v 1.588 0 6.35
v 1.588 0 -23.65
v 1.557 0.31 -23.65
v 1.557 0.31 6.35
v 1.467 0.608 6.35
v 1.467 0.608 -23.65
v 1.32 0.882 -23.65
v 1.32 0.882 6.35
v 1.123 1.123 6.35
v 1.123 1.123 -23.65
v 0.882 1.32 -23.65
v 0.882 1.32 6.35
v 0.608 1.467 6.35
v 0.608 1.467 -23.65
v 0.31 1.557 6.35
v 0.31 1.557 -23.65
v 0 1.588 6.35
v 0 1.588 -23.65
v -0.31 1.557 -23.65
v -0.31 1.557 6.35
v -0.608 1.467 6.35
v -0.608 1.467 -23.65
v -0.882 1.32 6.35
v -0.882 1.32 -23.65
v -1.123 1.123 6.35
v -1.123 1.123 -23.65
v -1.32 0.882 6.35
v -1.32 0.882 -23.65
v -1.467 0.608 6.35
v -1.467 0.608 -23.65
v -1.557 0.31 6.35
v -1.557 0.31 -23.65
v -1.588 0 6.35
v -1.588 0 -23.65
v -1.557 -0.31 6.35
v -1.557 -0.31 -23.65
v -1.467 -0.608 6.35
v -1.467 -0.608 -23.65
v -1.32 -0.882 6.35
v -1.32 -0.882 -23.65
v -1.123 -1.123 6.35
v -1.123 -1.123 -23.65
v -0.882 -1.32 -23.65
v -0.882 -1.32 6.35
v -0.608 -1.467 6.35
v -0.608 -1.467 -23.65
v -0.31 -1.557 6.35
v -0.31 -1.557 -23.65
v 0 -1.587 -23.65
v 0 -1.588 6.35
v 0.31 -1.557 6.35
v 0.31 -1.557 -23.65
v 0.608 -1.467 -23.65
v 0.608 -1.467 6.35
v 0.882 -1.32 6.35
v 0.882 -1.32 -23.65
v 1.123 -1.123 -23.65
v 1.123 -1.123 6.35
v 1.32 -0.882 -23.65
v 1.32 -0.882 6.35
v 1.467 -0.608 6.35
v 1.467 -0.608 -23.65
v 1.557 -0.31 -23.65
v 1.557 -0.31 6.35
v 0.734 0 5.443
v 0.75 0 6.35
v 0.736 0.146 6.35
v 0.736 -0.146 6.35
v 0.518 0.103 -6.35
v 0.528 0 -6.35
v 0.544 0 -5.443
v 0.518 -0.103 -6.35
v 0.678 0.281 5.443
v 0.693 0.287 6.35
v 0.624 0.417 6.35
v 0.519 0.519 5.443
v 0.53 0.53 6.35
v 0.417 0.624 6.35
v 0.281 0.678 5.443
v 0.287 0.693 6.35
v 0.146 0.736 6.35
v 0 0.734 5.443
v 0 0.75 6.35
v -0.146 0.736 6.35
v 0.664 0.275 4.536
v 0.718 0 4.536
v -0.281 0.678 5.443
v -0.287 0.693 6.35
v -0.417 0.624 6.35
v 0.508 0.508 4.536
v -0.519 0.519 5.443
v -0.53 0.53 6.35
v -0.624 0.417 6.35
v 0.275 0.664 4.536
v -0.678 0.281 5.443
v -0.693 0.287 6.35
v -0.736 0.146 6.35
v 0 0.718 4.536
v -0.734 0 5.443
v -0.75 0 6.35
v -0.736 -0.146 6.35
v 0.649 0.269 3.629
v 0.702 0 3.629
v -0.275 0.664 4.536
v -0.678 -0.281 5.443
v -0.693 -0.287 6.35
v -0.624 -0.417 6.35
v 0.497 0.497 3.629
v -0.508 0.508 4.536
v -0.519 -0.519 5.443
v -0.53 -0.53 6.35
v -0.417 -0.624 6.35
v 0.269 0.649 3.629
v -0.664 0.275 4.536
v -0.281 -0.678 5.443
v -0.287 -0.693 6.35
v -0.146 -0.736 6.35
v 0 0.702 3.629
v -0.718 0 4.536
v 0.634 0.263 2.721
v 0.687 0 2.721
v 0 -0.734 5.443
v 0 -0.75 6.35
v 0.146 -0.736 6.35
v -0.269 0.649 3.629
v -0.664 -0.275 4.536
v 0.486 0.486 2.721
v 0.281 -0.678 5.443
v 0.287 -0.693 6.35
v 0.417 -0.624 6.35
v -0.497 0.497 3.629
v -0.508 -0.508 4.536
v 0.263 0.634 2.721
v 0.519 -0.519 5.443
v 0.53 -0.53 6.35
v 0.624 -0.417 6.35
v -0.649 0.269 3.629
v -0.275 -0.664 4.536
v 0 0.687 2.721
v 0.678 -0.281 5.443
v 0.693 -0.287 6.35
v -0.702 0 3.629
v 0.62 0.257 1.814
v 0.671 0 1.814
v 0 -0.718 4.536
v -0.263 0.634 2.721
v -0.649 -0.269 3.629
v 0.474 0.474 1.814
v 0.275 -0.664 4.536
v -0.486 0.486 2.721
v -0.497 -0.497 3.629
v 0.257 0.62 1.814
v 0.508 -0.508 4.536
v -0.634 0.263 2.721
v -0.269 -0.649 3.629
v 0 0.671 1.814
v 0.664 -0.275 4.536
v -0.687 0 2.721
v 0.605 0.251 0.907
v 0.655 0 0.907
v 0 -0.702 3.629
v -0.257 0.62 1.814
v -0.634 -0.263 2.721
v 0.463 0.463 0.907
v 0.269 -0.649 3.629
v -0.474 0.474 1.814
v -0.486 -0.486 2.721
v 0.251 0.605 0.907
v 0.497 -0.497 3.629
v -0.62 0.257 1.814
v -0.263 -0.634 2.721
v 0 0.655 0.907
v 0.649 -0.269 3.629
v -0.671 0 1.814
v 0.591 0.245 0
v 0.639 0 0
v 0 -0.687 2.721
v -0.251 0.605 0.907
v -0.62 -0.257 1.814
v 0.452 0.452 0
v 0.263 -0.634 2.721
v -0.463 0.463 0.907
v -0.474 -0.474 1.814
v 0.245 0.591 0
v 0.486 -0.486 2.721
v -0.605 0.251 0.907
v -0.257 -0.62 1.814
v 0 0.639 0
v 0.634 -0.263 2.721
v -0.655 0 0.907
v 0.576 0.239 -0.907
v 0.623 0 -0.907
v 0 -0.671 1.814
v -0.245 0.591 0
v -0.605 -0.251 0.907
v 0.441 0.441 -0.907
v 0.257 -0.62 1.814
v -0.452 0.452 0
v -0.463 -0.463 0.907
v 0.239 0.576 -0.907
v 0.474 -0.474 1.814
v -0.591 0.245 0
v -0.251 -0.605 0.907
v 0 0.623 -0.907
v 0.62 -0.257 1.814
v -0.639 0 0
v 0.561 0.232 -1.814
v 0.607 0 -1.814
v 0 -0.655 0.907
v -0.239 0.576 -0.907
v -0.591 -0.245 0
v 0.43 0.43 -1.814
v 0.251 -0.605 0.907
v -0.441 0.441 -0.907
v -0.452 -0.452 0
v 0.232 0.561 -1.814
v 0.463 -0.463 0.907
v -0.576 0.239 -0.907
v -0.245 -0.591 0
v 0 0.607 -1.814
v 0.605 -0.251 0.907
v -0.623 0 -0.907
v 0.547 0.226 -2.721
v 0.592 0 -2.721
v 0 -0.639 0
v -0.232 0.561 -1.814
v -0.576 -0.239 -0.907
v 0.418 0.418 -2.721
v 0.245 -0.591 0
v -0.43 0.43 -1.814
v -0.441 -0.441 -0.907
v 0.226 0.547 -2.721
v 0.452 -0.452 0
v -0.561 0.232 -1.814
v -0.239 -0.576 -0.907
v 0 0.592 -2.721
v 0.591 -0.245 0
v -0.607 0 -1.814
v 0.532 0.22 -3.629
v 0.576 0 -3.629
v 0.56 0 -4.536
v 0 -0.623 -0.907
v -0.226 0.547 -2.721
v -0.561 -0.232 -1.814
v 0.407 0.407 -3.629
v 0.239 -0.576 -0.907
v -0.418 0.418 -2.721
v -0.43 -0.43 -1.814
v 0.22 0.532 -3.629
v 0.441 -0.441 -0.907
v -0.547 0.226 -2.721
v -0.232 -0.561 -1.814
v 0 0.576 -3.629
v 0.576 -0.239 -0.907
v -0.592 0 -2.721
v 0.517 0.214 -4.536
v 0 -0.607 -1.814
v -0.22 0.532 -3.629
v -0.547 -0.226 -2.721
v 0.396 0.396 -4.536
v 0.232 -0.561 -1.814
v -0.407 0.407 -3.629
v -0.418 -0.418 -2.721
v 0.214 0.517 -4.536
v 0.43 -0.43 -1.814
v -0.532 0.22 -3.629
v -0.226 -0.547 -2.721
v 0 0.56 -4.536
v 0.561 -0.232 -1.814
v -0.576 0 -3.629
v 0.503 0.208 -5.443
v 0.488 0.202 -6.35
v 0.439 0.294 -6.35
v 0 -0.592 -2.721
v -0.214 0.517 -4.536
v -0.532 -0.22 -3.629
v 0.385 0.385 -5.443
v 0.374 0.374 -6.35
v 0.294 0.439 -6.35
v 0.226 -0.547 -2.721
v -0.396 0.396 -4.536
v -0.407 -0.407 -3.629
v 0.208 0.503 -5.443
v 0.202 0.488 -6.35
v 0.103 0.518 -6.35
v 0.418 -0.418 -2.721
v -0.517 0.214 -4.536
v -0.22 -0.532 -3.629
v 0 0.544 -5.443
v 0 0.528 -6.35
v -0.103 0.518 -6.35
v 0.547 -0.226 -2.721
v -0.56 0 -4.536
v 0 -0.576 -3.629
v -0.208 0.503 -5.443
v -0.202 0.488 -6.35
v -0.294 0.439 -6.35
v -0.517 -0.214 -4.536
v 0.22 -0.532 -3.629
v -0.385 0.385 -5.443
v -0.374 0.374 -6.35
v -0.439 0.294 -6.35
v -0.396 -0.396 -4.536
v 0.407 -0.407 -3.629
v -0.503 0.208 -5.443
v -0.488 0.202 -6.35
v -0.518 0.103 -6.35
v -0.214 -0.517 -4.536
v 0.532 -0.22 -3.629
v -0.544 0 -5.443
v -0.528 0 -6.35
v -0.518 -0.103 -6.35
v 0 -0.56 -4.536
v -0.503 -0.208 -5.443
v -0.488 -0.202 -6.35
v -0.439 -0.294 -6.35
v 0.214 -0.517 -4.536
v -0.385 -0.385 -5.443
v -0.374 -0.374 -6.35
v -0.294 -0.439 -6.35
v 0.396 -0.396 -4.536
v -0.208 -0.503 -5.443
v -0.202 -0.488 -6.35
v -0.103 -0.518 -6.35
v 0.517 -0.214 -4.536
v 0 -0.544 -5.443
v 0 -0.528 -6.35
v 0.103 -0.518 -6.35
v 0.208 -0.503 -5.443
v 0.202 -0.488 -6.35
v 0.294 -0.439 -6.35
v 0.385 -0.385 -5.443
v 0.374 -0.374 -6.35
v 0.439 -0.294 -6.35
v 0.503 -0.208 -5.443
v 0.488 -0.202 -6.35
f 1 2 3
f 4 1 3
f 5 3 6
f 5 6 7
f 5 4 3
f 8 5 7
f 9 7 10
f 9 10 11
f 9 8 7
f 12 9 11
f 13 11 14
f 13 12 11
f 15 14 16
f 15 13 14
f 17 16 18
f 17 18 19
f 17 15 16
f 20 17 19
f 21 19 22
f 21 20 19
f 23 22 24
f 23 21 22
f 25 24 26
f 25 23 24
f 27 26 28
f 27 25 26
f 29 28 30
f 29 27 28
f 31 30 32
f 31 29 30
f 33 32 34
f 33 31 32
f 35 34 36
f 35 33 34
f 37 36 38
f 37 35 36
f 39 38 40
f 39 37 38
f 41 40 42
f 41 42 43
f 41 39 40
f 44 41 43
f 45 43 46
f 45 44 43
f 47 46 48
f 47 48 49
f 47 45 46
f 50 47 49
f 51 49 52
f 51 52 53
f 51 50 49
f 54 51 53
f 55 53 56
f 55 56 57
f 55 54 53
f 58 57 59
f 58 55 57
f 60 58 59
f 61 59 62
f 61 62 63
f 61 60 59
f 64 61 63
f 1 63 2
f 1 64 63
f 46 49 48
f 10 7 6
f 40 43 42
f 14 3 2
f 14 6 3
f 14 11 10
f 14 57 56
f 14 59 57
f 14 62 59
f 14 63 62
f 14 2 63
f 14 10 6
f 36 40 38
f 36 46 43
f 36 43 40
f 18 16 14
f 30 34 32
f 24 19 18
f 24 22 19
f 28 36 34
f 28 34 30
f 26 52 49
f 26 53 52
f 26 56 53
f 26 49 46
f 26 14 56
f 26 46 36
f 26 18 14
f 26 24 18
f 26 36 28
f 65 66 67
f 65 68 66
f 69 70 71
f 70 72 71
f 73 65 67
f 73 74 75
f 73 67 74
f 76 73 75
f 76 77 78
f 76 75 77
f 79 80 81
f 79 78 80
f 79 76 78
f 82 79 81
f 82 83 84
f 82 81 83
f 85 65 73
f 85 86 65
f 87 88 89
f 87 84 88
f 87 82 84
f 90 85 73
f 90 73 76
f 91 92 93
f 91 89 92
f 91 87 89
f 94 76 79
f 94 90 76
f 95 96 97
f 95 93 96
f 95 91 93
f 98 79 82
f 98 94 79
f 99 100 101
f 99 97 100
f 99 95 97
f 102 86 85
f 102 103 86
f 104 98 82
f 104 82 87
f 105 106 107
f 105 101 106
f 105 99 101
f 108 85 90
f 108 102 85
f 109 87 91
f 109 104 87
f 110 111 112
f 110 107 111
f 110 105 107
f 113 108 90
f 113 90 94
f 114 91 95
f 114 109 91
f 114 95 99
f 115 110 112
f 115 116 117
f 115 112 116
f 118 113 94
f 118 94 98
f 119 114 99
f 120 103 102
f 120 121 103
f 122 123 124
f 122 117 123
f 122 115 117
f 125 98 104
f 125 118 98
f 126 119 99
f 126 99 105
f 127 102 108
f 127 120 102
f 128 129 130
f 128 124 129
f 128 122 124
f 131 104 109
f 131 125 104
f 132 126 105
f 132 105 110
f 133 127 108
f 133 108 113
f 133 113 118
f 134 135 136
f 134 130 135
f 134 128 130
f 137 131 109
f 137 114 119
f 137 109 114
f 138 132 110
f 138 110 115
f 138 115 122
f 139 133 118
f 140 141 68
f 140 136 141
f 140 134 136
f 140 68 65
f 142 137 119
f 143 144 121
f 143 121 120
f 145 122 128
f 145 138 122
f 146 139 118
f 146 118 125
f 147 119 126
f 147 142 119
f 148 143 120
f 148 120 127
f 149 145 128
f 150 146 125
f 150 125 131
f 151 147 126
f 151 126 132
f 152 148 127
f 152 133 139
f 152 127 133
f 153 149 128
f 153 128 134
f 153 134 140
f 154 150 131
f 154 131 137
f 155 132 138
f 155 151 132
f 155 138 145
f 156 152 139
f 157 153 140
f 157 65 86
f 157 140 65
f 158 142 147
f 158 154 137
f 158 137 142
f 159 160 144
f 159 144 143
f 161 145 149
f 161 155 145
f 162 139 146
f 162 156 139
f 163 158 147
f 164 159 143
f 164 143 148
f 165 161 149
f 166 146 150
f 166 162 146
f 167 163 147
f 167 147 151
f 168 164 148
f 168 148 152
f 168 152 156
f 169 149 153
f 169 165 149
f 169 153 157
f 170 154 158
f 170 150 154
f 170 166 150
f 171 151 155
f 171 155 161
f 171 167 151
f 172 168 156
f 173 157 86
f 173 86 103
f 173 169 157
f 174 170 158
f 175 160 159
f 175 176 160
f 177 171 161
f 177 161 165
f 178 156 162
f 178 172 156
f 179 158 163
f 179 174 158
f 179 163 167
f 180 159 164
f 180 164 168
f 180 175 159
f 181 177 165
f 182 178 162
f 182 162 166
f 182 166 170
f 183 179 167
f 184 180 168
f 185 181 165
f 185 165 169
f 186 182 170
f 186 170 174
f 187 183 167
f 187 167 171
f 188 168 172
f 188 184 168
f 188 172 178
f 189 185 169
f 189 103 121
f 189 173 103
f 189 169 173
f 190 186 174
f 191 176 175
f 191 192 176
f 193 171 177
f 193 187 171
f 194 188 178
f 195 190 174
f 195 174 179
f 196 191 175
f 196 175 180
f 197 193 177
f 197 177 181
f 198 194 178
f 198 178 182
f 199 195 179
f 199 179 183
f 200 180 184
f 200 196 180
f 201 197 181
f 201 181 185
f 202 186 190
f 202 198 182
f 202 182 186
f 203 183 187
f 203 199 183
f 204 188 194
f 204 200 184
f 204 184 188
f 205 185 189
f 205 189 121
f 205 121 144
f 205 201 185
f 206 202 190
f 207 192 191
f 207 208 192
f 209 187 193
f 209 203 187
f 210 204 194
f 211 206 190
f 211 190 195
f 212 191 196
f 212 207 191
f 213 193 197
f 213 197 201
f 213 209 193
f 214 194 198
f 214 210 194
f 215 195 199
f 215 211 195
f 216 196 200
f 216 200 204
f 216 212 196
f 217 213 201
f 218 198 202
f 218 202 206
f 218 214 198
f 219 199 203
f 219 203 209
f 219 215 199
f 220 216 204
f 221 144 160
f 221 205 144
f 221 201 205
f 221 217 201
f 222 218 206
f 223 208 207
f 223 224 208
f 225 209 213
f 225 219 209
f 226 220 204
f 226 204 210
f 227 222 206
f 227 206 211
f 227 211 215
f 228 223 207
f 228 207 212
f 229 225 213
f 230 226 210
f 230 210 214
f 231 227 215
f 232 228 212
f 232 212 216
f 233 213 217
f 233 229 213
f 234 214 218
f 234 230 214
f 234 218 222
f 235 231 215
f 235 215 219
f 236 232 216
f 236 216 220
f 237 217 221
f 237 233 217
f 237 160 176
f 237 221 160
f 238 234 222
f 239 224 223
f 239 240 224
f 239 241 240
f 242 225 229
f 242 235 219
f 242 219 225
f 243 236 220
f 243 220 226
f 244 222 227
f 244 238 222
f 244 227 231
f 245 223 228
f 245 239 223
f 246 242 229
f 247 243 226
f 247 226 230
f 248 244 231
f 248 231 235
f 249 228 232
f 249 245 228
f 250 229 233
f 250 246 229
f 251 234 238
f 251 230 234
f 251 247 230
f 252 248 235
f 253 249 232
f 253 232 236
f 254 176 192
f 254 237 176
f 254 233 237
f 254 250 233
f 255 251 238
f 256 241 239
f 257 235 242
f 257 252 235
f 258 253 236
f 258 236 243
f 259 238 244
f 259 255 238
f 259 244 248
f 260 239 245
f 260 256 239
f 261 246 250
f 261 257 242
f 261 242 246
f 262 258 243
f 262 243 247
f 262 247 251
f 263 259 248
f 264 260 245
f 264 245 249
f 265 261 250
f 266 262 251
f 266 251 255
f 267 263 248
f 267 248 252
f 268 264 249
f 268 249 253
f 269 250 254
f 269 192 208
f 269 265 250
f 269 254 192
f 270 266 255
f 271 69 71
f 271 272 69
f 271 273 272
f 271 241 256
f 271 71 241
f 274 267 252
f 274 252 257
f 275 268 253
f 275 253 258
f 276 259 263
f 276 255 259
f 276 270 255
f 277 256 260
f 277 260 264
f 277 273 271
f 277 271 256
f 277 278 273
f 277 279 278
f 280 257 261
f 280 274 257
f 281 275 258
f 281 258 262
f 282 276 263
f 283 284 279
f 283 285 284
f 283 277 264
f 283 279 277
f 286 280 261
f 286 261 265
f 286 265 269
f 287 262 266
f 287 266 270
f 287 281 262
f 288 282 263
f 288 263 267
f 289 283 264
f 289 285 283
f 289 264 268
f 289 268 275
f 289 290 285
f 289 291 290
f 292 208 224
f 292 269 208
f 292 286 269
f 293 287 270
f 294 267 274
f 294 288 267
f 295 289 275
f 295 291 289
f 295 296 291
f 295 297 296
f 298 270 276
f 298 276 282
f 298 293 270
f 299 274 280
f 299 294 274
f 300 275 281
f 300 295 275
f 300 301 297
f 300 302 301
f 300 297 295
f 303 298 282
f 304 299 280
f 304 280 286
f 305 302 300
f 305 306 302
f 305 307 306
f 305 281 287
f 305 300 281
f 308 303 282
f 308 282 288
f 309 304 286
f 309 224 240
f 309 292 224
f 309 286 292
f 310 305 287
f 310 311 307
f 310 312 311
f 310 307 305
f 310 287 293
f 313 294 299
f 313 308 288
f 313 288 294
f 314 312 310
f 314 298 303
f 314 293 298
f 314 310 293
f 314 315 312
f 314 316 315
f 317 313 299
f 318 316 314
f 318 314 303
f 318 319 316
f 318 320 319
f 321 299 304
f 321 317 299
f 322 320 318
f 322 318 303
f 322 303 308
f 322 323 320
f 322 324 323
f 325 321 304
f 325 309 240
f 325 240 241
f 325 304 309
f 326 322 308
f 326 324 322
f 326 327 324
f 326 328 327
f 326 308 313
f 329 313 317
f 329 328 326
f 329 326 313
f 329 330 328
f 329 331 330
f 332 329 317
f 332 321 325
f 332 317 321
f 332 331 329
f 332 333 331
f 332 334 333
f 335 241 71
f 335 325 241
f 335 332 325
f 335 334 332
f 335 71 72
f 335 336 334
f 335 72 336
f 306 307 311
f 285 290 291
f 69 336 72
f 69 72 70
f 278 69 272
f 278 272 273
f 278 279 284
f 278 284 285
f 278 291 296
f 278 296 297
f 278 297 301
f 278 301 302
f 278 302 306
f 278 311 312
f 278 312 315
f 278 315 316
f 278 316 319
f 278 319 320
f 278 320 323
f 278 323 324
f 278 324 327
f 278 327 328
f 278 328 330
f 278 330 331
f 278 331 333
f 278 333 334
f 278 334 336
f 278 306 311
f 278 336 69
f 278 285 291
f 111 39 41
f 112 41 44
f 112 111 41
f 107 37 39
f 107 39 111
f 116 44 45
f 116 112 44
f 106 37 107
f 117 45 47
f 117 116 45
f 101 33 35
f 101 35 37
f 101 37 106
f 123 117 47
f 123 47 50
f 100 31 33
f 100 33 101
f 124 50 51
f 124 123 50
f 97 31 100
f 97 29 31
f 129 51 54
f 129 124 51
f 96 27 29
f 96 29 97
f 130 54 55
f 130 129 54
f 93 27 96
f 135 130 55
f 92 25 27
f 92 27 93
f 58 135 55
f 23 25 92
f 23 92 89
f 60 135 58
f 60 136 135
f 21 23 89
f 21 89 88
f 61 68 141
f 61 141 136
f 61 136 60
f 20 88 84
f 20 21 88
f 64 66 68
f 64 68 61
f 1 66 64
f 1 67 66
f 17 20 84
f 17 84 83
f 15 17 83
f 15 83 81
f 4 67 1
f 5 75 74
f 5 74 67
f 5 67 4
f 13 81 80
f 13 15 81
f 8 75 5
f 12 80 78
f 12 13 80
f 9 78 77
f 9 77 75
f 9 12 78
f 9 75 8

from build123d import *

# Parameters (mm, degrees)
SKETCH1_R                = 1.5875
BOSS_EXTRUDE1_DEPTH      = 6.35
BOSS_EXTRUDE1_DEPTH_BACK = 31.304
SKETCH2_R                = 1.5875
CUT_EXTRUDE1_DEPTH       = 7.654
SKETCH3_R                = 0.750000024
CUT_EXTRUDE2_DEPTH       = 12.7
CUT_EXTRUDE2_TAPER       = 1


with BuildPart() as part:
    # Sketch1 → Boss-Extrude1 (new body, two sides)
    with BuildSketch(Plane.XY) as boss_extrude1_sk:
        Circle(SKETCH1_R)
    extrude(amount=BOSS_EXTRUDE1_DEPTH)
    extrude(boss_extrude1_sk.sketch, amount=-BOSS_EXTRUDE1_DEPTH_BACK)

    # Sketch2 → Cut-Extrude1 (cut)
    with BuildSketch(Plane(origin=(0, 0, -31.304), x_dir=(-1, 0, 0), z_dir=(0, 0, -1))):
        Circle(SKETCH2_R)
    extrude(amount=-CUT_EXTRUDE1_DEPTH, mode=Mode.SUBTRACT)

    # Sketch3 → Cut-Extrude2 (cut)
    with BuildSketch(Plane.XY.offset(6.35)):
        Circle(SKETCH3_R)
    extrude(amount=-CUT_EXTRUDE2_DEPTH, taper=CUT_EXTRUDE2_TAPER, mode=Mode.SUBTRACT)


solid = part.part
